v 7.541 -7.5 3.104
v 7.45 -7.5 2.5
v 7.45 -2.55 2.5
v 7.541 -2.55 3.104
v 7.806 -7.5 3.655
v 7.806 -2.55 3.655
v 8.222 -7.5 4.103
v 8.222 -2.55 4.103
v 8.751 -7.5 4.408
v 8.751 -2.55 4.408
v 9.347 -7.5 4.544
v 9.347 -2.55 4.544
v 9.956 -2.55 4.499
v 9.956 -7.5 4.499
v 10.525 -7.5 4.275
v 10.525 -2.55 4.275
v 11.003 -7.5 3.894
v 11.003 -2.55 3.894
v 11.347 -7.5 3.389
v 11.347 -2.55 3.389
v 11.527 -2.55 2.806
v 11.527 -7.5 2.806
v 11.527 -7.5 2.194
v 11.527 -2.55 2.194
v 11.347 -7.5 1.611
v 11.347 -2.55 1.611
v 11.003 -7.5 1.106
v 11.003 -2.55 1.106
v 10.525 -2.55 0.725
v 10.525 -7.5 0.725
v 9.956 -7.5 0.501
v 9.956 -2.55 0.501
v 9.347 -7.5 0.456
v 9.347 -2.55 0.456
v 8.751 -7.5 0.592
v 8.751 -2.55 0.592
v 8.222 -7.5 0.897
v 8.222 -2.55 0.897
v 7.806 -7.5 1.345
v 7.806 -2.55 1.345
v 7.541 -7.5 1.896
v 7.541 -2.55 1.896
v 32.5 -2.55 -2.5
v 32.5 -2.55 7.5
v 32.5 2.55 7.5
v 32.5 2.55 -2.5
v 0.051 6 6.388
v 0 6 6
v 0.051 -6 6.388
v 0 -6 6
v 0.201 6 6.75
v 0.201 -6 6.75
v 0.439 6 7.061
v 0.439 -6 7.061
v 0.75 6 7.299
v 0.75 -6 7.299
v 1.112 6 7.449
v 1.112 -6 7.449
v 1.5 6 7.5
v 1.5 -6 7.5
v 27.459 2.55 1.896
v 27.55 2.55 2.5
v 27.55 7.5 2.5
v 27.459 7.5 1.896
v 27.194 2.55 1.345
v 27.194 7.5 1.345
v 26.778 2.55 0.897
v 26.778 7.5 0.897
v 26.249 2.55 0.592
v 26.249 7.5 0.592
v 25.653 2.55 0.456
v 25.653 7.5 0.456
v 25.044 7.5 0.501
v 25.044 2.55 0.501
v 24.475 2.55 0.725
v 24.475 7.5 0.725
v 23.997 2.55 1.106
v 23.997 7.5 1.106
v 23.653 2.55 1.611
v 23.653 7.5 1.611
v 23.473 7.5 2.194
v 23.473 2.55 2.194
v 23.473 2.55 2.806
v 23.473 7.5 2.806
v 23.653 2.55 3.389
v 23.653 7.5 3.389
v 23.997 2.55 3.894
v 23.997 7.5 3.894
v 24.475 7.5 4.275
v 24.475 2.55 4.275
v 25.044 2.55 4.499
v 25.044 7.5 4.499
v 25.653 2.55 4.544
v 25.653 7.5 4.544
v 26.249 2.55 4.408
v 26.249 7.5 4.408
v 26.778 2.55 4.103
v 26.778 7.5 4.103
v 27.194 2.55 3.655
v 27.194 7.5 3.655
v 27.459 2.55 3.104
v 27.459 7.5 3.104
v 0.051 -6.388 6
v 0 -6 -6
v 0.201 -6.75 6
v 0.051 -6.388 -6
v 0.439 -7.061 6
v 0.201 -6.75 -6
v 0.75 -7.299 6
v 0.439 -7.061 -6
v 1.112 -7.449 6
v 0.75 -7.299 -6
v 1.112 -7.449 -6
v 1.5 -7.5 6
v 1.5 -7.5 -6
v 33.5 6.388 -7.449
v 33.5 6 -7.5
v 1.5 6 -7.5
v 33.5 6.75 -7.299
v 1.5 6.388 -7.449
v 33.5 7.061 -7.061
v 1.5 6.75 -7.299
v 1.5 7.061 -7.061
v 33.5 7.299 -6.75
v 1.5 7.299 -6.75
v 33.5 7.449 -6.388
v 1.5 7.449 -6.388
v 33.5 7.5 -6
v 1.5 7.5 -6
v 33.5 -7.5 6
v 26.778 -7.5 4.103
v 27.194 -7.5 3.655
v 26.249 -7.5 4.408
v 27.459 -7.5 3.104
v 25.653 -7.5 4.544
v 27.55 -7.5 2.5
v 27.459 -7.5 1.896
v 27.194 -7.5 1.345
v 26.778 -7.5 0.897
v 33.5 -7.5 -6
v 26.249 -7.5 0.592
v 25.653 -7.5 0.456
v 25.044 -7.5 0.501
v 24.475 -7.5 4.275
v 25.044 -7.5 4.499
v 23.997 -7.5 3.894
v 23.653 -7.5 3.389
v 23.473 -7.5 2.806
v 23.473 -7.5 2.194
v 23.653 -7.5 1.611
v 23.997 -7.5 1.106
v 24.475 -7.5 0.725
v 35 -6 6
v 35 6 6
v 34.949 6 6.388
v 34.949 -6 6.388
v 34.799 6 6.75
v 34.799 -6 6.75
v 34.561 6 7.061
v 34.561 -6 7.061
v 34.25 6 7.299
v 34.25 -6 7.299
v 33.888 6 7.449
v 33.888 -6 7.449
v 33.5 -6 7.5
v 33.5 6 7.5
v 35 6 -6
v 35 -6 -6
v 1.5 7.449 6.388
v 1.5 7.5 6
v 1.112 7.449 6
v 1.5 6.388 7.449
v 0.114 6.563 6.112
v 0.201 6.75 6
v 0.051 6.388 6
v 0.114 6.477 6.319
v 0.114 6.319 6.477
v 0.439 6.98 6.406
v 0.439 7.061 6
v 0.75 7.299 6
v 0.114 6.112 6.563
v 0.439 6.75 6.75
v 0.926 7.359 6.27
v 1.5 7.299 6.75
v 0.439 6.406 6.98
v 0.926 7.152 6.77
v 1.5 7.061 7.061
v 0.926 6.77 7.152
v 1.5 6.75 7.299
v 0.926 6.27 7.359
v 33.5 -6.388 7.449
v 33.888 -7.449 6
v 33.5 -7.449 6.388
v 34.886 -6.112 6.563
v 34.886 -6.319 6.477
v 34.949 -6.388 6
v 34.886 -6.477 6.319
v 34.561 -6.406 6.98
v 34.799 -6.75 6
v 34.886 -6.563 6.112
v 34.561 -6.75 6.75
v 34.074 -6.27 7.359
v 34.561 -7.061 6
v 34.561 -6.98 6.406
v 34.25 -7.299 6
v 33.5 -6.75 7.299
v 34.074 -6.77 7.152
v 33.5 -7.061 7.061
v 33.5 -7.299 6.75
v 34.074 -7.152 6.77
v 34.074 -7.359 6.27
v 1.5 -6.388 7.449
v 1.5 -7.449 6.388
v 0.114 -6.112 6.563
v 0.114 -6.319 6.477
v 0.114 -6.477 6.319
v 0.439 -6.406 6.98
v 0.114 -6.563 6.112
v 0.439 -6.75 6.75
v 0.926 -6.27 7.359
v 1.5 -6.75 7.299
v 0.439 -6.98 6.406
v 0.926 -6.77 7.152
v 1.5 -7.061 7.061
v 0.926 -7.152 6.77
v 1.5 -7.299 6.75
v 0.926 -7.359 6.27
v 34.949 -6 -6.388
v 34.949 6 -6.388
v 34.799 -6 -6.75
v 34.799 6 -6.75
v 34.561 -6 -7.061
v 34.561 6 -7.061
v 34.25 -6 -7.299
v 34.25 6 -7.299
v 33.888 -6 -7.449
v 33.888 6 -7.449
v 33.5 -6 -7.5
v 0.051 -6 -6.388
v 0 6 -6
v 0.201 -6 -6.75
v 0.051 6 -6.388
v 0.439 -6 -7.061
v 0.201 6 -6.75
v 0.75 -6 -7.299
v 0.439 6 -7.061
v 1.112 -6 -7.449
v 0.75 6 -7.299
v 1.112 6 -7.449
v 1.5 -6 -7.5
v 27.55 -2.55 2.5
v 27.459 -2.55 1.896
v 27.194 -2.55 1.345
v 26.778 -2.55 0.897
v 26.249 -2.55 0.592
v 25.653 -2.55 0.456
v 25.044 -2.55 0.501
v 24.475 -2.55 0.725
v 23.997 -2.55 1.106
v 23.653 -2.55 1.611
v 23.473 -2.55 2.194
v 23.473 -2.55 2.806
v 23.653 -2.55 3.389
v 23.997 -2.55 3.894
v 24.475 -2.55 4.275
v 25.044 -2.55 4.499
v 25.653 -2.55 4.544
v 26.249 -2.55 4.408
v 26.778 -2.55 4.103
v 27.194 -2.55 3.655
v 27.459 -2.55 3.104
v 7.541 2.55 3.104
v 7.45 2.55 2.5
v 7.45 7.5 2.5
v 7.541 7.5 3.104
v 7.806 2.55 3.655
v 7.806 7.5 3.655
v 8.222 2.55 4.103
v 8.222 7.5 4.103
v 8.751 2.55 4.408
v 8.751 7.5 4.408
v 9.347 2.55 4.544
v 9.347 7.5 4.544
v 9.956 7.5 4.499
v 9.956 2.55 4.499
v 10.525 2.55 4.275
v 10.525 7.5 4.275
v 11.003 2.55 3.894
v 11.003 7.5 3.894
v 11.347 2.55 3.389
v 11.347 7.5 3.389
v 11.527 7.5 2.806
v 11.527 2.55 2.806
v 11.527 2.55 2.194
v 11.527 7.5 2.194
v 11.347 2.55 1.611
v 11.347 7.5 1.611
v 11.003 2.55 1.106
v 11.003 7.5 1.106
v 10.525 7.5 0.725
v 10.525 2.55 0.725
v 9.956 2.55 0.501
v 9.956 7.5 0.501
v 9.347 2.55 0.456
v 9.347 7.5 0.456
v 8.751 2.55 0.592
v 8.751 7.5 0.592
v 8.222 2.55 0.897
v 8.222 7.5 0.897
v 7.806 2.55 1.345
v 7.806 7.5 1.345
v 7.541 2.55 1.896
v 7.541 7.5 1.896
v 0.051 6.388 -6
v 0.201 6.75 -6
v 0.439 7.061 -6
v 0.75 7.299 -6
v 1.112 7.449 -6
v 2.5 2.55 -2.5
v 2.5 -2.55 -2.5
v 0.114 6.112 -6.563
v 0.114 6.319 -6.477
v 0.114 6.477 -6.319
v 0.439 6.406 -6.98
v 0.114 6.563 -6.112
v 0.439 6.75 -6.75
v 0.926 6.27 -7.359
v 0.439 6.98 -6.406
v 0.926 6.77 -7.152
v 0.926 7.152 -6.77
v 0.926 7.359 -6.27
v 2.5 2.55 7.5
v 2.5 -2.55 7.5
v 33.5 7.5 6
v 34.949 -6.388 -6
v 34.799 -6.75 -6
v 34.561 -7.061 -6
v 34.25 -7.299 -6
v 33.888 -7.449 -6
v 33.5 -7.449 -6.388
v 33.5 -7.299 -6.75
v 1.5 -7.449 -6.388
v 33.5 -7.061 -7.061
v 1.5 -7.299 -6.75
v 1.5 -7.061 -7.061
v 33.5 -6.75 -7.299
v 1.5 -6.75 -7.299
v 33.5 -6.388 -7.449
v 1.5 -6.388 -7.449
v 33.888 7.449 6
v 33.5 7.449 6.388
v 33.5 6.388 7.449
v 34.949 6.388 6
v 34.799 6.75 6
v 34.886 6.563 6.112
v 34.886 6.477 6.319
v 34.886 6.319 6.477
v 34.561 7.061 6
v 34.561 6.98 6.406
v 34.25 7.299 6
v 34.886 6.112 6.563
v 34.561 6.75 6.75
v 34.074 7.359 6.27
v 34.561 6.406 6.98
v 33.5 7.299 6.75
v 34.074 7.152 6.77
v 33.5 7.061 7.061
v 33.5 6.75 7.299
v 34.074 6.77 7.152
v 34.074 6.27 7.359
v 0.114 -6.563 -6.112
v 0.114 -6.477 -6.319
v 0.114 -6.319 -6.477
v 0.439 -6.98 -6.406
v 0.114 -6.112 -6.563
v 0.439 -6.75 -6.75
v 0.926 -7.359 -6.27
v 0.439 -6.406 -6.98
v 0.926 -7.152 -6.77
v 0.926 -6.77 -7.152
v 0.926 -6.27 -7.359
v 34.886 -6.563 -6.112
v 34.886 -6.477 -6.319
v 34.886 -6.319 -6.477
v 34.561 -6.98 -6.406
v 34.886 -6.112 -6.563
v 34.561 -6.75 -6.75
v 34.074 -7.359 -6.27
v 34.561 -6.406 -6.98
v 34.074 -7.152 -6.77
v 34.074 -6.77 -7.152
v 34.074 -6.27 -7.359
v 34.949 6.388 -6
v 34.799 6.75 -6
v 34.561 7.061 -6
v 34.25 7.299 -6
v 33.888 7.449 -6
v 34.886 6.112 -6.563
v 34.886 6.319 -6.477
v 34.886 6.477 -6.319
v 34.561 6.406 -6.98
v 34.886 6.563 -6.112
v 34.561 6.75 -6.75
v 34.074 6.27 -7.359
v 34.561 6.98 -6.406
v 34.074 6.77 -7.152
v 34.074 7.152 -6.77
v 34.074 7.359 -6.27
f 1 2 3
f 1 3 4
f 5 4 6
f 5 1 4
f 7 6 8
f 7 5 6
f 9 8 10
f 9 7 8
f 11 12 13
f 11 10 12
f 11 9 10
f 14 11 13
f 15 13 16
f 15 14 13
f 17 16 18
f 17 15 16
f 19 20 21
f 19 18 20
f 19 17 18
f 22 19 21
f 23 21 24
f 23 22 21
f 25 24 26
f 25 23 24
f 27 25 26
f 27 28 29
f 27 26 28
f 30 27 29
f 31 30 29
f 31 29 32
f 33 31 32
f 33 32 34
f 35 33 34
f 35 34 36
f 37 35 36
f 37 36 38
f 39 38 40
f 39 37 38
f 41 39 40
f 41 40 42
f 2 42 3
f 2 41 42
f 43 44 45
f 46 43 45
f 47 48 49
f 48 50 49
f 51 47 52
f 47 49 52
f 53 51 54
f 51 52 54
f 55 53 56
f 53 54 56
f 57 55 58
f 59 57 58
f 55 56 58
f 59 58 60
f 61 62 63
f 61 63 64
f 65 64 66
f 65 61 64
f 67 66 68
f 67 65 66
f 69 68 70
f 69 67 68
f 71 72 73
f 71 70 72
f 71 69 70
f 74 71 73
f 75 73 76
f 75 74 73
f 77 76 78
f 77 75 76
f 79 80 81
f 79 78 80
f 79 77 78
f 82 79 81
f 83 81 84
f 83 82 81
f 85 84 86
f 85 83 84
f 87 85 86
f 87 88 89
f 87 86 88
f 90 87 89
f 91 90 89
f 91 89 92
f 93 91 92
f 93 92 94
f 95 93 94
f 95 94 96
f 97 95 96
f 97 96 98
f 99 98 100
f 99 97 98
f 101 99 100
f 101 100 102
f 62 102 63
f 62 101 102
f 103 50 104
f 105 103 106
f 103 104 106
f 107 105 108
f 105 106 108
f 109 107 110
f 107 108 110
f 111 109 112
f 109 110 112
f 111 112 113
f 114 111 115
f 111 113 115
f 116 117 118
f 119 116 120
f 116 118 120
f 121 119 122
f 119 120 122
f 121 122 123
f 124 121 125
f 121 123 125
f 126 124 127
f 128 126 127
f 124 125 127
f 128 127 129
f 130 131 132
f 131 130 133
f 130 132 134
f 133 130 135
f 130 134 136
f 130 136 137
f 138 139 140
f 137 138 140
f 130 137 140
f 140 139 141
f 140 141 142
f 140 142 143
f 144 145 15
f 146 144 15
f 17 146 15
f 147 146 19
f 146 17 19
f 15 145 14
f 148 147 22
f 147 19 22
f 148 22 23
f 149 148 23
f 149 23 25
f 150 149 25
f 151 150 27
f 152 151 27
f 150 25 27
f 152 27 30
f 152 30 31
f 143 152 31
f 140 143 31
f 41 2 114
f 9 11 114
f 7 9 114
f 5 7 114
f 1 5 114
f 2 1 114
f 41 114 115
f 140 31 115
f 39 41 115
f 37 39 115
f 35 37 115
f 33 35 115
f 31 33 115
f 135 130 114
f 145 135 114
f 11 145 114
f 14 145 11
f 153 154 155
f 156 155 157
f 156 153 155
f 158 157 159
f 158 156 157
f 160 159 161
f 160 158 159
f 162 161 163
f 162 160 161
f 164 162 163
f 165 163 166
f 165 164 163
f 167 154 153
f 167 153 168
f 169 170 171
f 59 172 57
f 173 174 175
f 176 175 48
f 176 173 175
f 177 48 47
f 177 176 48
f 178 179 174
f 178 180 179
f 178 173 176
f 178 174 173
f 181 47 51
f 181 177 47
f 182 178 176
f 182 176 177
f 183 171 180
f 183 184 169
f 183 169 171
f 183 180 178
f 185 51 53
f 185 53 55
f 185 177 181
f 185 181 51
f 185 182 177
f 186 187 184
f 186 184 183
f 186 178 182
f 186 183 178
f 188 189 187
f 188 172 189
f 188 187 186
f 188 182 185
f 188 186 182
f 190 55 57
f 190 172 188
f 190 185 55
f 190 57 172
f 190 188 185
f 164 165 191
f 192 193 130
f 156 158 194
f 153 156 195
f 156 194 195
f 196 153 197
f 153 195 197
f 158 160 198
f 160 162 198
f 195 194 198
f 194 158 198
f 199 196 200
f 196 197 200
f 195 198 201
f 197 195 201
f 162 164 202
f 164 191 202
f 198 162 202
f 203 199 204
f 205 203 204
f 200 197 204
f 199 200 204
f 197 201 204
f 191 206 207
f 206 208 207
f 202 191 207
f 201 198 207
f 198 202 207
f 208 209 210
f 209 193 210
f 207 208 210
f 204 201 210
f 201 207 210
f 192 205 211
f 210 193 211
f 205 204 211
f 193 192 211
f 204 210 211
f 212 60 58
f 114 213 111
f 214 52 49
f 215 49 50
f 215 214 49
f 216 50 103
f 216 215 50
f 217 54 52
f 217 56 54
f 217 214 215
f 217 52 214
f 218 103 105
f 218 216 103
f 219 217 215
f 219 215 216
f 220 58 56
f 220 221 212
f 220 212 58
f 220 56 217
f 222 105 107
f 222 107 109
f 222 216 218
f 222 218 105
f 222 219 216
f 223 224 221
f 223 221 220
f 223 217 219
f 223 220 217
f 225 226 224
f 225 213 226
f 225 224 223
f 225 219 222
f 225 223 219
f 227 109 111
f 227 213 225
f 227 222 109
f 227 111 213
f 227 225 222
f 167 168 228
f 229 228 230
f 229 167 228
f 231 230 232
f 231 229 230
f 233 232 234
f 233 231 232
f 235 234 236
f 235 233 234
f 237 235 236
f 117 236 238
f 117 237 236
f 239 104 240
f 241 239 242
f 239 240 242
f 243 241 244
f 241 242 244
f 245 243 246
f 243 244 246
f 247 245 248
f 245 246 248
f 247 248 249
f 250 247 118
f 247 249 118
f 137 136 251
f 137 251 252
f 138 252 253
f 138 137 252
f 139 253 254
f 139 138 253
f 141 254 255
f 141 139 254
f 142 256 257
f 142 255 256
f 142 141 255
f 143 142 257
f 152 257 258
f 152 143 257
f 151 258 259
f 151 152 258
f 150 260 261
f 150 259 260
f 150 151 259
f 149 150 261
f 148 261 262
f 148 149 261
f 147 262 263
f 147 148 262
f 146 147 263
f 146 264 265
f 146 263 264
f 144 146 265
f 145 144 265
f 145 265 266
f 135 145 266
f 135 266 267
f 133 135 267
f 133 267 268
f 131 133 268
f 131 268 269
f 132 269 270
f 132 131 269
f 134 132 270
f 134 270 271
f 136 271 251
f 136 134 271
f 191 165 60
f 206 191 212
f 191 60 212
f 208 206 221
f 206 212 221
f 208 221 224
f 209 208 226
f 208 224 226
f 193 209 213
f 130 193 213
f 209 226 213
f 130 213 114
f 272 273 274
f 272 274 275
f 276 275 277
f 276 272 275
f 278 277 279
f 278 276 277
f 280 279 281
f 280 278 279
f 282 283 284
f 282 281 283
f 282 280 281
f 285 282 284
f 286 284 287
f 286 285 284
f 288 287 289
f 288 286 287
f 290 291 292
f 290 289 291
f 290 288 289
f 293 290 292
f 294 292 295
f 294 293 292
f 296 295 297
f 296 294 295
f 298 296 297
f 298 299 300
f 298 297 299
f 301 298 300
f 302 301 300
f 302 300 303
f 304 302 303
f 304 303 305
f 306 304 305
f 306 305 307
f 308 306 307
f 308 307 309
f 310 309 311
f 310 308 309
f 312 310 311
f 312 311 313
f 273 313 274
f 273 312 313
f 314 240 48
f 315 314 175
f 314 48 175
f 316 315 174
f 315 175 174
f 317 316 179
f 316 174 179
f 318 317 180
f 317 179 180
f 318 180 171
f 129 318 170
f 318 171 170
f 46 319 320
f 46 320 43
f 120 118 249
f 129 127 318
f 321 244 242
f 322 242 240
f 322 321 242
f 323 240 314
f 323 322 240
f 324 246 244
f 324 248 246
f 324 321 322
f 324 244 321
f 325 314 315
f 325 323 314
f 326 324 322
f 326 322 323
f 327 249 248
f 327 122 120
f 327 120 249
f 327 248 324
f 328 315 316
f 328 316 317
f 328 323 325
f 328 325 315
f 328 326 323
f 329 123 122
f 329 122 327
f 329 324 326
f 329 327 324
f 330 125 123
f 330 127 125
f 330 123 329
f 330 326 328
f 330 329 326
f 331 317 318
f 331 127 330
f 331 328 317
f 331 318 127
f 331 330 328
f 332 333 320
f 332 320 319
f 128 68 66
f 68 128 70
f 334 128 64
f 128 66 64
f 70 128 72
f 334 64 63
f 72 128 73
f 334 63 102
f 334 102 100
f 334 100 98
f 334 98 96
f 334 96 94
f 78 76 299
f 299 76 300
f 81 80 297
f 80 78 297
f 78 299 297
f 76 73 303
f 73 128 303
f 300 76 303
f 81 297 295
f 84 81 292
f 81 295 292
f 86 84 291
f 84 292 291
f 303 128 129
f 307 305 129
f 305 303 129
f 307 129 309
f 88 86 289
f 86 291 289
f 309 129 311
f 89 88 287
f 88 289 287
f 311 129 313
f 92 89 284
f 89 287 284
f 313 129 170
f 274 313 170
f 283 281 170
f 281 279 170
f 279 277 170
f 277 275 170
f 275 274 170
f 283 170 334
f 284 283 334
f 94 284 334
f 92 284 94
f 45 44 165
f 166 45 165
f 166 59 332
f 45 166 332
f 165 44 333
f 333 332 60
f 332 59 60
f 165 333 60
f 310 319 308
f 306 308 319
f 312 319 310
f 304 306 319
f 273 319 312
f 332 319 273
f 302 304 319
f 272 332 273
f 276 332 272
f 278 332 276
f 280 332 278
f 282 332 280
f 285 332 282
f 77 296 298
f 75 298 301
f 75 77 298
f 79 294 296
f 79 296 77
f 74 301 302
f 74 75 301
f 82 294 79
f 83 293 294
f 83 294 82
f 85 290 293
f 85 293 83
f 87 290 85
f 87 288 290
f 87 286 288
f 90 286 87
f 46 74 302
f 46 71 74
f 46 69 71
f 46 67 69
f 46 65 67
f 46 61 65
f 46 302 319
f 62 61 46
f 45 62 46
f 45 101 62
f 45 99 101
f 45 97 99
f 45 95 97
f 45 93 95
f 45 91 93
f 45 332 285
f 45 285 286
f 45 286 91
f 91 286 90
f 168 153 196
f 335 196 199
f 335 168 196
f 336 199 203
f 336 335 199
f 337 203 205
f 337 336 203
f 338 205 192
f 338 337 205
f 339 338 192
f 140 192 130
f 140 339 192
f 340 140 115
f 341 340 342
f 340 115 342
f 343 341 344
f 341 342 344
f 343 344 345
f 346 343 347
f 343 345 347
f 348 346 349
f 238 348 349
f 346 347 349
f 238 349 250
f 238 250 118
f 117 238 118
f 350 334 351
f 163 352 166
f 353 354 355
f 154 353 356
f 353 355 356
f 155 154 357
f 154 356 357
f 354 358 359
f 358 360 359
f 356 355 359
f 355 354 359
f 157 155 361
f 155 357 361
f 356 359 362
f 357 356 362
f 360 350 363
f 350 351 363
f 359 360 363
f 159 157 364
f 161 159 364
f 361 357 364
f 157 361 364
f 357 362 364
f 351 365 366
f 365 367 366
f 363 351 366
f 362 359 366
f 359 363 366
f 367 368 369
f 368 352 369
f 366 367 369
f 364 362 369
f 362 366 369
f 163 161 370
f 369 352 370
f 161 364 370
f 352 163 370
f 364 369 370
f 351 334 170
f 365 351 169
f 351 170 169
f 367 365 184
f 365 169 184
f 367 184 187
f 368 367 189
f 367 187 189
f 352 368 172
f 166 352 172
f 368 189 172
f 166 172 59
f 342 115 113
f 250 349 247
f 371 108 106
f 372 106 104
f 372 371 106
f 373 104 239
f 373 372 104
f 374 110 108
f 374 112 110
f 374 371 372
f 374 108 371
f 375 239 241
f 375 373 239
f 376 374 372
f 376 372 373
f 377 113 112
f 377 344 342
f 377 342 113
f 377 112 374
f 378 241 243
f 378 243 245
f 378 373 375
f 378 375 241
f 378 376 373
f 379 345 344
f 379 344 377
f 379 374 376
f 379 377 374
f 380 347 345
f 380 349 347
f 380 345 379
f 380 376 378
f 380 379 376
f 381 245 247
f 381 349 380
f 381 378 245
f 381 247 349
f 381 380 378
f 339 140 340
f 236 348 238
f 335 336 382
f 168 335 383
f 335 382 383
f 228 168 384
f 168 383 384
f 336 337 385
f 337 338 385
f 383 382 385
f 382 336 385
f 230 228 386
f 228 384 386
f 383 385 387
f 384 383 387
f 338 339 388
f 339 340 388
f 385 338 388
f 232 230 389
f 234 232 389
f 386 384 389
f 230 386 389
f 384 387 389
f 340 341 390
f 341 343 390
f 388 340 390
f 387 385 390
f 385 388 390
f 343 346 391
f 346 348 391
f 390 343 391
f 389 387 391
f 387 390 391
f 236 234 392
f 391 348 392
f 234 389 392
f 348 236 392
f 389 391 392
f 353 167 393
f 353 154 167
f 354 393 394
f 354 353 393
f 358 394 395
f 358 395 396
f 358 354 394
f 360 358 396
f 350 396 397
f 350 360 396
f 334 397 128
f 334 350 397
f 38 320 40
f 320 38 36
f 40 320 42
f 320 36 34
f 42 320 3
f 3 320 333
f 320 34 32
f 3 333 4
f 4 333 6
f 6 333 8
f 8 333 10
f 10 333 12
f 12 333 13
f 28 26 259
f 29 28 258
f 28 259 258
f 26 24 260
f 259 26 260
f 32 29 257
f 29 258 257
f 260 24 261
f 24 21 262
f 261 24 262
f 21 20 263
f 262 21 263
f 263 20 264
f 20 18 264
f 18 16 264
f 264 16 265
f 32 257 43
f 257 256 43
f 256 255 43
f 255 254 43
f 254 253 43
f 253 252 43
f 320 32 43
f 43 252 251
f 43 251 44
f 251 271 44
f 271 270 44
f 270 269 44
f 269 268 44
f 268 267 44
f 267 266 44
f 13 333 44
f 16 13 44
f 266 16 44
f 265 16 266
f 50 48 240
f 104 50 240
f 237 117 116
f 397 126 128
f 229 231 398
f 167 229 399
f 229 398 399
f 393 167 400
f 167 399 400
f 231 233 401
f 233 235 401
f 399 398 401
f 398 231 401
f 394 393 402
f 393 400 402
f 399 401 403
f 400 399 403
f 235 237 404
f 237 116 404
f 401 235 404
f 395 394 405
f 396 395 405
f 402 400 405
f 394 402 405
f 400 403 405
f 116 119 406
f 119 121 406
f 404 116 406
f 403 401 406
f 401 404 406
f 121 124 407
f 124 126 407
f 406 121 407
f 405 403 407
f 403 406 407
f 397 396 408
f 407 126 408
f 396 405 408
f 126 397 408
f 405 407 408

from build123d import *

# Parameters (mm, degrees)
BOSS_EXTRU_1_DEPTH           = 35
ESQUISSE2_W                  = 30
ESQUISSE2_H                  = 5.1
ENL_V_MAT_EXTRU_1_DEPTH      = 10
ENL_V_MAT_EXTRU_2_DEPTH      = 38.178656511
ENL_V_MAT_EXTRU_2_DEPTH_BACK = 38.178656511
ESQUISSE3_R                  = 2.05
CONG_1_R                     = 1.5


with BuildPart() as part:
    # Esquisse1 → Boss.-Extru.1 (new body)
    with BuildSketch(Plane(origin=(0, 0, 0), x_dir=(0, 0, -1), z_dir=(1, 0, 0))):
        with BuildLine():
            Line((6, 7.5), (-6, 7.5))
            ThreePointArc((-6, 7.5), (-7.060660172, 7.060660172), (-7.5, 6))
            Line((-7.5, 6), (-7.5, -6))
            ThreePointArc((-7.5, -6), (-7.060660172, -7.060660172), (-6, -7.5))
            Line((-6, -7.5), (6, -7.5))
            ThreePointArc((6, -7.5), (7.060660172, -7.060660172), (7.5, -6))
            Line((7.5, -6), (7.5, 6))
            ThreePointArc((7.5, 6), (7.060660172, 7.060660172), (6, 7.5))
        make_face()
    extrude(amount=BOSS_EXTRU_1_DEPTH)

    # Esquisse2 → Enlèv. mat.-Extru.1 (cut)
    with BuildSketch(Plane.XY.offset(7.5)):
        with Locations((17.5, 0)):
            Rectangle(ESQUISSE2_W, ESQUISSE2_H)
    extrude(amount=-ENL_V_MAT_EXTRU_1_DEPTH, mode=Mode.SUBTRACT)

    # Esquisse3 → Enlèv. mat.-Extru.2 (cut, two sides: drawn at the far end of the back side and taken through both)
    with BuildSketch(Plane(origin=(0, -2.55, 0), x_dir=(1, 0, 0), z_dir=(0, 1, 0)).offset(-ENL_V_MAT_EXTRU_2_DEPTH_BACK)):
        with Locations(Location((9.5, -2.5, 0), (0, 0, 180))):
            Circle(ESQUISSE3_R)
        with Locations((25.5, -2.5)):
            Circle(ESQUISSE3_R)
    extrude(amount=ENL_V_MAT_EXTRU_2_DEPTH + ENL_V_MAT_EXTRU_2_DEPTH_BACK, mode=Mode.SUBTRACT)

    # Congé1
    cong_1_edges = [part.edges().sort_by_distance(p)[0] for p in [
        (0, 0, 7.5),
        (0, 7.060660172, 7.060660172),
        (0, 7.5, 0),
        (0, 7.060660172, -7.060660172),
        (35, 7.060660172, 7.060660172),
        (35, 0, 7.5),
        (35, -7.060660172, 7.060660172),
        (35, -7.5, 0),
        (35, -7.060660172, -7.060660172),
        (35, 0, -7.5),
        (35, 7.060660172, -7.060660172),
        (0, 0, -7.5),
        (35, 7.5, 0),
        (0, -7.060660172, -7.060660172),
        (0, -7.5, 0),
        (0, -7.060660172, 7.060660172),
    ]]
    fillet(cong_1_edges, radius=CONG_1_R)


solid = part.part
